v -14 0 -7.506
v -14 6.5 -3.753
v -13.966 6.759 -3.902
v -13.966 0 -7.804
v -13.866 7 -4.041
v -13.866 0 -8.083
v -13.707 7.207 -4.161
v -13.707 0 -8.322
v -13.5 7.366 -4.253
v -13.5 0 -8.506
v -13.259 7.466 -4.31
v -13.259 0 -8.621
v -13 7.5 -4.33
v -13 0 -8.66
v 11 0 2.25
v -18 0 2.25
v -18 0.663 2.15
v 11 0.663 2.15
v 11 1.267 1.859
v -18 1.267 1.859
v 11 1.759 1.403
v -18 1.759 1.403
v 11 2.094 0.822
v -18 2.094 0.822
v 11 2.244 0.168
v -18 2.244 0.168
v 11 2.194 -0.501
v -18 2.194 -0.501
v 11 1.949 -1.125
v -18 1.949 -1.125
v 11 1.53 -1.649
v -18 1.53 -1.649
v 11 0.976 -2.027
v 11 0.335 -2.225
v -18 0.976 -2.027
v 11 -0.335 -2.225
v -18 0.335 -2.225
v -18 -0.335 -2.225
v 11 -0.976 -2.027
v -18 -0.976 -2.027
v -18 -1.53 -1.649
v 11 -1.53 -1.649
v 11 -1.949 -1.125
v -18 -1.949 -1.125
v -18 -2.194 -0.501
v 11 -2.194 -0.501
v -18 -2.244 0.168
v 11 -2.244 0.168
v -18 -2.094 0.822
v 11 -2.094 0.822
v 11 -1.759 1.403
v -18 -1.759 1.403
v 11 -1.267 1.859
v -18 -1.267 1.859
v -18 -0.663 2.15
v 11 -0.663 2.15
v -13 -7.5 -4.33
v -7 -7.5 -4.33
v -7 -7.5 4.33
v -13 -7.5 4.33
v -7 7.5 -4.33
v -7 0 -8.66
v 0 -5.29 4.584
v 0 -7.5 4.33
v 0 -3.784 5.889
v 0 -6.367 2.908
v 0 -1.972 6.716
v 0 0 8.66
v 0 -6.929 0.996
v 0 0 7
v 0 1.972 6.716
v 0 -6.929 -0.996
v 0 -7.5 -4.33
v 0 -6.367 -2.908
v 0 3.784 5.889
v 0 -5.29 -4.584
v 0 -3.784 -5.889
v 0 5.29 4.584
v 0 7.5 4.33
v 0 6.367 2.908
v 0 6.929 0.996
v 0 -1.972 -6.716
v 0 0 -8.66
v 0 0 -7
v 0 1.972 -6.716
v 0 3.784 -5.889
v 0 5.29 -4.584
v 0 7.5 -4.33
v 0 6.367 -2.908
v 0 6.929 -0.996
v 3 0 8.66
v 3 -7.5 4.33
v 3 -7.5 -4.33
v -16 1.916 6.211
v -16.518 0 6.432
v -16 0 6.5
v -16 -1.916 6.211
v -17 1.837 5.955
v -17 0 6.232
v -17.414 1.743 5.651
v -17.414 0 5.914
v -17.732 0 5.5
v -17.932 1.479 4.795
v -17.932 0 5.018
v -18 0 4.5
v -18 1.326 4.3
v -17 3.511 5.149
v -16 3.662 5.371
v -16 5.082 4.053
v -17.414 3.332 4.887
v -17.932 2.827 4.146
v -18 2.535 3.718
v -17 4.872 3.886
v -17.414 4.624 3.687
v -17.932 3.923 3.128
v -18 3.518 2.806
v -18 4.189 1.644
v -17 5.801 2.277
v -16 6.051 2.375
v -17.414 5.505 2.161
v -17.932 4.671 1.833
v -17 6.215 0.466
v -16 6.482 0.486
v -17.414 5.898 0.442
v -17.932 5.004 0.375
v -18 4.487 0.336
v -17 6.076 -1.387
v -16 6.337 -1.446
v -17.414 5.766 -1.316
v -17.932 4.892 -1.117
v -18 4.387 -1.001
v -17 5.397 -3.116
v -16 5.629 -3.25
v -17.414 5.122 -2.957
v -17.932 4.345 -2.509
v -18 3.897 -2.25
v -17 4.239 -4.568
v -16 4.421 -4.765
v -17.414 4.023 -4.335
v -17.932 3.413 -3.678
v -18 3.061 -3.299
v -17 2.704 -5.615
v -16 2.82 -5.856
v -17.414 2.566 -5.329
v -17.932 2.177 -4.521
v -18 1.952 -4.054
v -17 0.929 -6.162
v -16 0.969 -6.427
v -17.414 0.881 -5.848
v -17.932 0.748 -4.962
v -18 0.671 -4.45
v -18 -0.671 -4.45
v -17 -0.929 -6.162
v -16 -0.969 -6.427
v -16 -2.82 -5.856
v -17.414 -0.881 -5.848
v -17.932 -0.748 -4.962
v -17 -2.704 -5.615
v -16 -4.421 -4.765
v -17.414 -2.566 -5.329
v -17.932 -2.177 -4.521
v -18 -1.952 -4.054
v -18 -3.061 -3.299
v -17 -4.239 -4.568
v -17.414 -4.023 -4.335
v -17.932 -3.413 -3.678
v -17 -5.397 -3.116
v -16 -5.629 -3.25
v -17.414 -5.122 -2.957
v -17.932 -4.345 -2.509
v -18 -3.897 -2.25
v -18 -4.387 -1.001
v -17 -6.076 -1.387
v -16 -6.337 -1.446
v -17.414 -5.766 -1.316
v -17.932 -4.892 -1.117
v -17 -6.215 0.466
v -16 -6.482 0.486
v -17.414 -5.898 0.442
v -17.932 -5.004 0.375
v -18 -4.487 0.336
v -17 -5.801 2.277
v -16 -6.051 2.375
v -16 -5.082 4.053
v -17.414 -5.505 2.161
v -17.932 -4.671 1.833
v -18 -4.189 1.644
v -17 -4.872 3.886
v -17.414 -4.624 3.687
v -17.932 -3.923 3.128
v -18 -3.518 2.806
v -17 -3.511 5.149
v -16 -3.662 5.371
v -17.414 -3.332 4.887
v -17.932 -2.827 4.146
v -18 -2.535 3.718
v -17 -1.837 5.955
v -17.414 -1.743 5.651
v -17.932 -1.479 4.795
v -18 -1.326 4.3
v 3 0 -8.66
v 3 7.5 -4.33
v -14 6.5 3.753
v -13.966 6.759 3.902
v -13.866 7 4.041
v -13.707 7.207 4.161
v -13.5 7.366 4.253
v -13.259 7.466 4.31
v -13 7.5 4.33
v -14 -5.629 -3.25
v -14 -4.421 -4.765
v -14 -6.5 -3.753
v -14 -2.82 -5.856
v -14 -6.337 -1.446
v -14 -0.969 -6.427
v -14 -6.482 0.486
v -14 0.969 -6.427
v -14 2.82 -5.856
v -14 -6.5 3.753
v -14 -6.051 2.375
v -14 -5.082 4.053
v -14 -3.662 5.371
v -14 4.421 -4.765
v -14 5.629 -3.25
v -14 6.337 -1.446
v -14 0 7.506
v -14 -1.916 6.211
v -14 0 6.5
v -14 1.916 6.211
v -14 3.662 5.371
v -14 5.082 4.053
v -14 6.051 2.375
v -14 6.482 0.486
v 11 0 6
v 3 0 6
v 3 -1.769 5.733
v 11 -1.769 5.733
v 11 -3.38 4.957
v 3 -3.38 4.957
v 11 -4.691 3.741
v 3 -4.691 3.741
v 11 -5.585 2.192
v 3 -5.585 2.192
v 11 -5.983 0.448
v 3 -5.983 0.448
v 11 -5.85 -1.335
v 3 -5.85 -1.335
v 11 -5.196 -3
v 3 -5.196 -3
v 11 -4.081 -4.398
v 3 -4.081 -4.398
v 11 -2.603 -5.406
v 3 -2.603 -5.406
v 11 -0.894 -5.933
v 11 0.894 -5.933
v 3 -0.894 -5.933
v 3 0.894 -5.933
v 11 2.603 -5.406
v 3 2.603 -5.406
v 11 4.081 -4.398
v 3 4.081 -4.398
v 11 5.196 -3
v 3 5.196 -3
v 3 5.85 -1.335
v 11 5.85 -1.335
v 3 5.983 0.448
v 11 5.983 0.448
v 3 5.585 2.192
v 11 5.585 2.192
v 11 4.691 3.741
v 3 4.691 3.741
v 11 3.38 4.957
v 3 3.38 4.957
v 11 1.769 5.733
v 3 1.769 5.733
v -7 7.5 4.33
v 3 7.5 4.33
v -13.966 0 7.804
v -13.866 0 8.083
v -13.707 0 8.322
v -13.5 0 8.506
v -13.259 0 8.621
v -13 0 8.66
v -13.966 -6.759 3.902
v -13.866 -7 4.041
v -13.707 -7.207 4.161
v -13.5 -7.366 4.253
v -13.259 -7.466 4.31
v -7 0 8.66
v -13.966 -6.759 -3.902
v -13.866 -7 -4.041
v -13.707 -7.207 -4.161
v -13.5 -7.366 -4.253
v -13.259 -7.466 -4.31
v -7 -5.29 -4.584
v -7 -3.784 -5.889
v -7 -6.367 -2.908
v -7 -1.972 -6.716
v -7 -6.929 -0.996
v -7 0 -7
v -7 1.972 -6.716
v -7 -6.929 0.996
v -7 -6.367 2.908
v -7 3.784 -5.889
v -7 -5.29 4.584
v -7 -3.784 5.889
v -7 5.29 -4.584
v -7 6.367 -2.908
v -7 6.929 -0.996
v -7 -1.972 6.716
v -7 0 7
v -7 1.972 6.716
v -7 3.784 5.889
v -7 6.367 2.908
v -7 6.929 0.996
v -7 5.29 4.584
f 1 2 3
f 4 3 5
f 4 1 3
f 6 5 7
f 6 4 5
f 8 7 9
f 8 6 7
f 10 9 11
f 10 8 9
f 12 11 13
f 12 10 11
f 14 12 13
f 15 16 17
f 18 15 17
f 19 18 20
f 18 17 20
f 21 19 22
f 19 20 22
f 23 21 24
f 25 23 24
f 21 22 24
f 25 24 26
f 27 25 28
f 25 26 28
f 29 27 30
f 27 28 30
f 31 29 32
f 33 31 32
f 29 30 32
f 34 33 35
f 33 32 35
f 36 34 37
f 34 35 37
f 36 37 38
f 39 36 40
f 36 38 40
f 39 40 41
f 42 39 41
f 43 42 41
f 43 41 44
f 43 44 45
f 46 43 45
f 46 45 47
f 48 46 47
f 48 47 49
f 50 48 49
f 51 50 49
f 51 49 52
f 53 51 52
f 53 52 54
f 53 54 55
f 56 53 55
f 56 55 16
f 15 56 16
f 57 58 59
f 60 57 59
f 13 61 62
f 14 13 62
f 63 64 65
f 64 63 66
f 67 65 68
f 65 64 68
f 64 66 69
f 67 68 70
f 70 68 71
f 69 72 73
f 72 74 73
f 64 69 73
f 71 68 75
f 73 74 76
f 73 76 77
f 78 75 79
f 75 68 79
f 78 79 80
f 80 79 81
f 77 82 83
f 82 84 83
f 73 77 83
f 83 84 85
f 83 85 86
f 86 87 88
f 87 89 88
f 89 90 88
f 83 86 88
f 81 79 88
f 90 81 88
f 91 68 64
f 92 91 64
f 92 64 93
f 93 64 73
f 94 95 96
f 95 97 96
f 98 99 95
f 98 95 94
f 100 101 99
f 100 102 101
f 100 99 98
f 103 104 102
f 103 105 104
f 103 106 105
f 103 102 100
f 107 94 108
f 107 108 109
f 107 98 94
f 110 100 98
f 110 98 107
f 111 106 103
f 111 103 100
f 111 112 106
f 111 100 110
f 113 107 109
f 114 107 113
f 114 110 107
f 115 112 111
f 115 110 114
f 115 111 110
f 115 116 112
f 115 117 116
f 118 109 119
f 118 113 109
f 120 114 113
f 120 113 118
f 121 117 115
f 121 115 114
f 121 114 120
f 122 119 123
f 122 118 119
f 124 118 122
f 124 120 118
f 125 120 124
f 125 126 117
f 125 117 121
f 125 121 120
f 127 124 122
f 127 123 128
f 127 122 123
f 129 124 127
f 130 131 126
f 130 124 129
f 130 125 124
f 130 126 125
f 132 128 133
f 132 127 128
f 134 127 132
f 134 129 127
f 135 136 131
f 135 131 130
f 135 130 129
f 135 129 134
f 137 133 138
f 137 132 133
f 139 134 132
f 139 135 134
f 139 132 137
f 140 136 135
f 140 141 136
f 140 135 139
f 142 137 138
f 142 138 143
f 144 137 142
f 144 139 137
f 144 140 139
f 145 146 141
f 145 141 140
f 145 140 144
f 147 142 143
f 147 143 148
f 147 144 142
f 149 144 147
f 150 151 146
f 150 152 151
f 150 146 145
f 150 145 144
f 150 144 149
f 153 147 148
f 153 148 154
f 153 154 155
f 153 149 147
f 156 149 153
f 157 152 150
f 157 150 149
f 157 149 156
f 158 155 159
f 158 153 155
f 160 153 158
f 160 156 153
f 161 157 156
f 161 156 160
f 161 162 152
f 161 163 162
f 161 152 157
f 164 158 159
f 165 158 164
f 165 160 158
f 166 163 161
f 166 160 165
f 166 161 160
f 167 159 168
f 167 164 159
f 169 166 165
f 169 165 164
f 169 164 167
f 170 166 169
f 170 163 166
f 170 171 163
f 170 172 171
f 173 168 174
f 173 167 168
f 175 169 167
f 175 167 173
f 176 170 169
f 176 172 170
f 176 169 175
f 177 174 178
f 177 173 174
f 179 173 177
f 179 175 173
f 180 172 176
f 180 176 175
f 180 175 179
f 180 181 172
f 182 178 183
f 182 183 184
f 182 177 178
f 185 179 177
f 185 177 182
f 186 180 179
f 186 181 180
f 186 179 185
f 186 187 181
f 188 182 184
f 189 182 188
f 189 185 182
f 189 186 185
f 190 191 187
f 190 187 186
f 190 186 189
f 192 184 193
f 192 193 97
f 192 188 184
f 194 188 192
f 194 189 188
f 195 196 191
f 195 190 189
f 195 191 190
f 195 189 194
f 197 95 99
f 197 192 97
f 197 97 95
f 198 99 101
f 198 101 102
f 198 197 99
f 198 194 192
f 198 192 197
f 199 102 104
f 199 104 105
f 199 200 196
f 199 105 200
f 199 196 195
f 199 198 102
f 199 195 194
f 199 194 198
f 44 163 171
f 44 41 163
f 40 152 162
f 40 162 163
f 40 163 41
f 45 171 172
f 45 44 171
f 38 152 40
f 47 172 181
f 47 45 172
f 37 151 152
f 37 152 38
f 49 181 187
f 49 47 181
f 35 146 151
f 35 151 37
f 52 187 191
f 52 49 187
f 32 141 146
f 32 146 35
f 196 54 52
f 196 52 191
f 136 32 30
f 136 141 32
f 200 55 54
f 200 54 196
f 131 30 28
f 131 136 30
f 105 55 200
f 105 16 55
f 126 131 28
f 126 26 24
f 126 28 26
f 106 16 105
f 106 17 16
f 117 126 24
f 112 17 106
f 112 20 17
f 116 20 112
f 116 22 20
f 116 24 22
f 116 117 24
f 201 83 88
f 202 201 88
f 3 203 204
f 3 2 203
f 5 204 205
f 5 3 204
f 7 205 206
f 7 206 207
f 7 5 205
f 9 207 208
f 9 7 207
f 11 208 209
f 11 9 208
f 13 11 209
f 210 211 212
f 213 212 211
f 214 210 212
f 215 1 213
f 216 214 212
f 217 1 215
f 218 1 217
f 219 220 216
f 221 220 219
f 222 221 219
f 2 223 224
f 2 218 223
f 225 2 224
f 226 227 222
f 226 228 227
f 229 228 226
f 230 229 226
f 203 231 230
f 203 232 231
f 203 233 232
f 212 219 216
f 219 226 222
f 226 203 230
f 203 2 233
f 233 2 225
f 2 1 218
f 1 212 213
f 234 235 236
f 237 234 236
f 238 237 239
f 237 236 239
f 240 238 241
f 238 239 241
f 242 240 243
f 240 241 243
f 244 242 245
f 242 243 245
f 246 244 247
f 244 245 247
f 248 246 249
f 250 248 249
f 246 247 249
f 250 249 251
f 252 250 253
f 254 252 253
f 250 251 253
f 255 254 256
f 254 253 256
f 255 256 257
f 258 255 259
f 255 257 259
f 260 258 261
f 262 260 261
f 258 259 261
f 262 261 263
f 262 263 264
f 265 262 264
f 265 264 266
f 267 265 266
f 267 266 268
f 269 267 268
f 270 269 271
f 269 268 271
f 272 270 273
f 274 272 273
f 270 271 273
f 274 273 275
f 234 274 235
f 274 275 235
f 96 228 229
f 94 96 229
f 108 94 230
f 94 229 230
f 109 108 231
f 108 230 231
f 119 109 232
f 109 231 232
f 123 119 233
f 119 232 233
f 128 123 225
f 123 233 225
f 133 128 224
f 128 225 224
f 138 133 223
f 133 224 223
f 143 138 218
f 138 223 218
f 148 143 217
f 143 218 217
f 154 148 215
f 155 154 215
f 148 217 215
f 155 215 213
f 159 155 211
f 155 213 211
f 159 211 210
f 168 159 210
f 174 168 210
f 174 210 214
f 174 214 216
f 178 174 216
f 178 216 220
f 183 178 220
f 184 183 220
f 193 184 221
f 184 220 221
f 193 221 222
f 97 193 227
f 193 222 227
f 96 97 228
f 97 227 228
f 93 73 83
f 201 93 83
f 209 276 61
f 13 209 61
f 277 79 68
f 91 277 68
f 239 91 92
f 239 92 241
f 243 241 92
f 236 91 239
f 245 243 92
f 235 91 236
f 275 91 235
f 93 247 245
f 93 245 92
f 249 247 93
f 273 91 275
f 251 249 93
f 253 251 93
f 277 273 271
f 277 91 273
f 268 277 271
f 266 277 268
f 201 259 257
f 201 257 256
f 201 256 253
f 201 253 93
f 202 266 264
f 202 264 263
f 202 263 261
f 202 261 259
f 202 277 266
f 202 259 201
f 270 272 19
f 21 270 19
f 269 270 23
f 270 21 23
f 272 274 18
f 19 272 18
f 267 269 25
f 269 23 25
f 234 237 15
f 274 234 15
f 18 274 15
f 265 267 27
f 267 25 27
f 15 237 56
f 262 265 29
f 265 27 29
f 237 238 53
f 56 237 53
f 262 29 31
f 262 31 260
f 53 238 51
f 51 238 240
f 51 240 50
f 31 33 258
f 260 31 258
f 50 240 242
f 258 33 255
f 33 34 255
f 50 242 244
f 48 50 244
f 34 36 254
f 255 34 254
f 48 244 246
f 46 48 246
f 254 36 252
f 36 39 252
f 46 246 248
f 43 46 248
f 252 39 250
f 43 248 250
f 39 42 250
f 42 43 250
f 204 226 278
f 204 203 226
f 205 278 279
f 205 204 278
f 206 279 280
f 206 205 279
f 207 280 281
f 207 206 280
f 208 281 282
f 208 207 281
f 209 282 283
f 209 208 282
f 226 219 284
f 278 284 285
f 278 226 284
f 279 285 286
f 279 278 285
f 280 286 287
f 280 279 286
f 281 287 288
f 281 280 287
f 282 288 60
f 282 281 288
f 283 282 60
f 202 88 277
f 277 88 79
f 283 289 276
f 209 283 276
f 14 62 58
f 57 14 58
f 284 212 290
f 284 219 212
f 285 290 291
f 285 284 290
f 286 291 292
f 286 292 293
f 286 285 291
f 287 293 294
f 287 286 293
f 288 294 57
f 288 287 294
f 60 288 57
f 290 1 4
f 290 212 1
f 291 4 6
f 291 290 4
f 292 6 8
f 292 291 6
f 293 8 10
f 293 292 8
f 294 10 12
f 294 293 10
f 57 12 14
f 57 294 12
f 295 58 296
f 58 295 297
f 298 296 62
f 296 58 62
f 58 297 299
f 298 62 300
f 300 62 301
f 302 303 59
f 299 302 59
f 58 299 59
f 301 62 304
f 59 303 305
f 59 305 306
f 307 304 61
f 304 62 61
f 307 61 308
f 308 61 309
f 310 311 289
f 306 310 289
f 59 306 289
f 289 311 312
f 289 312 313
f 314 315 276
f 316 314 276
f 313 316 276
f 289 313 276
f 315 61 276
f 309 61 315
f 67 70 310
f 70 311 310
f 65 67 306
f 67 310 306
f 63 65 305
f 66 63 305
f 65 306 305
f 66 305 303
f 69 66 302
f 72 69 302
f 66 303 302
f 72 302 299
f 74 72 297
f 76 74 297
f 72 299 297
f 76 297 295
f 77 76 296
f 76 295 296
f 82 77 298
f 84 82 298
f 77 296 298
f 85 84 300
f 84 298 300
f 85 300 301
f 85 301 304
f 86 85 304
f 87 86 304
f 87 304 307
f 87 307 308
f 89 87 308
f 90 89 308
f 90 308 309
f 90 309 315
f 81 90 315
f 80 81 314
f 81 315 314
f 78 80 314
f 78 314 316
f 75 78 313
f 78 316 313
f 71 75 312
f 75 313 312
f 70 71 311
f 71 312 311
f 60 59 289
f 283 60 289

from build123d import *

# Parameters (mm, degrees)
BOSS_EXTRUDE1_DEPTH = 3
BOSS_EXTRUDE2_DEPTH = 7
SKETCH4_R           = 6.5
BOSS_EXTRUDE3_DEPTH = 4
FILLET1_R           = 2
FILLET2_R           = 1
SKETCH5_R           = 2.25
CUT_EXTRUDE1_DEPTH  = 32.180923655


with BuildPart() as part:
    # Sketch1 → Revolve1 (revolve)
    with BuildSketch(Plane.XY, mode=Mode.PRIVATE) as revolve1_sk:
        Polygon((11, 0), (11, 6), (0, 6), (0, 7), (-7, 7), (-7, 0), align=None)
    revolve(revolve1_sk.sketch.rotate(Axis((-13.395348837, 0, 0), (1, 0, 0)), 90), axis=Axis((-13.395348837, 0, 0), (1, 0, 0)))

    # Sketch2 → Boss-Extrude1 (add)
    with BuildSketch(Plane(origin=(0, 0, 0), x_dir=(0, 0, -1), z_dir=(1, 0, 0))):
        Polygon((4.330127019, -7.5), (8.660254038, 0), (4.330127019, 7.5), (-4.330127019, 7.5), (-8.660254038, 0), (-4.330127019, -7.5), align=None)
    extrude(amount=BOSS_EXTRUDE1_DEPTH)

    # Sketch3 → Boss-Extrude2 (add)
    with BuildSketch(Plane.ZY.offset(7)):
        Polygon((4.330127019, -7.5), (8.660254038, 0), (4.330127019, 7.5), (-4.330127019, 7.5), (-8.660254038, 0), (-4.330127019, -7.5), align=None)
    extrude(amount=BOSS_EXTRUDE2_DEPTH)

    # Sketch4 → Boss-Extrude3 (add)
    with BuildSketch(Plane.ZY.offset(14)):
        Circle(SKETCH4_R)
    extrude(amount=BOSS_EXTRUDE3_DEPTH)

    # Fillet1
    fillet1_edges = [part.edges().sort_by_distance(p)[0] for p in [
        (-18, 0, -6.5),
    ]]
    fillet(fillet1_edges, radius=FILLET1_R)

    # Fillet2
    fillet2_edges = [part.edges().sort_by_distance(p)[0] for p in [
        (-14, -7.5, 0),
        (-14, -3.75, 6.495190528),
        (-14, 3.75, 6.495190528),
        (-14, 7.5, 0),
        (-14, 3.75, -6.495190528),
        (-14, -3.75, -6.495190528),
    ]]
    fillet(fillet2_edges, radius=FILLET2_R - 0.0001)  # a hair under: the kernel refuses the full size

    # Sketch5 → Cut-Extrude1 (cut, through all)
    with BuildSketch(Plane.ZY.offset(18)):
        Circle(SKETCH5_R)
    extrude(amount=-CUT_EXTRUDE1_DEPTH, mode=Mode.SUBTRACT)


solid = part.part
